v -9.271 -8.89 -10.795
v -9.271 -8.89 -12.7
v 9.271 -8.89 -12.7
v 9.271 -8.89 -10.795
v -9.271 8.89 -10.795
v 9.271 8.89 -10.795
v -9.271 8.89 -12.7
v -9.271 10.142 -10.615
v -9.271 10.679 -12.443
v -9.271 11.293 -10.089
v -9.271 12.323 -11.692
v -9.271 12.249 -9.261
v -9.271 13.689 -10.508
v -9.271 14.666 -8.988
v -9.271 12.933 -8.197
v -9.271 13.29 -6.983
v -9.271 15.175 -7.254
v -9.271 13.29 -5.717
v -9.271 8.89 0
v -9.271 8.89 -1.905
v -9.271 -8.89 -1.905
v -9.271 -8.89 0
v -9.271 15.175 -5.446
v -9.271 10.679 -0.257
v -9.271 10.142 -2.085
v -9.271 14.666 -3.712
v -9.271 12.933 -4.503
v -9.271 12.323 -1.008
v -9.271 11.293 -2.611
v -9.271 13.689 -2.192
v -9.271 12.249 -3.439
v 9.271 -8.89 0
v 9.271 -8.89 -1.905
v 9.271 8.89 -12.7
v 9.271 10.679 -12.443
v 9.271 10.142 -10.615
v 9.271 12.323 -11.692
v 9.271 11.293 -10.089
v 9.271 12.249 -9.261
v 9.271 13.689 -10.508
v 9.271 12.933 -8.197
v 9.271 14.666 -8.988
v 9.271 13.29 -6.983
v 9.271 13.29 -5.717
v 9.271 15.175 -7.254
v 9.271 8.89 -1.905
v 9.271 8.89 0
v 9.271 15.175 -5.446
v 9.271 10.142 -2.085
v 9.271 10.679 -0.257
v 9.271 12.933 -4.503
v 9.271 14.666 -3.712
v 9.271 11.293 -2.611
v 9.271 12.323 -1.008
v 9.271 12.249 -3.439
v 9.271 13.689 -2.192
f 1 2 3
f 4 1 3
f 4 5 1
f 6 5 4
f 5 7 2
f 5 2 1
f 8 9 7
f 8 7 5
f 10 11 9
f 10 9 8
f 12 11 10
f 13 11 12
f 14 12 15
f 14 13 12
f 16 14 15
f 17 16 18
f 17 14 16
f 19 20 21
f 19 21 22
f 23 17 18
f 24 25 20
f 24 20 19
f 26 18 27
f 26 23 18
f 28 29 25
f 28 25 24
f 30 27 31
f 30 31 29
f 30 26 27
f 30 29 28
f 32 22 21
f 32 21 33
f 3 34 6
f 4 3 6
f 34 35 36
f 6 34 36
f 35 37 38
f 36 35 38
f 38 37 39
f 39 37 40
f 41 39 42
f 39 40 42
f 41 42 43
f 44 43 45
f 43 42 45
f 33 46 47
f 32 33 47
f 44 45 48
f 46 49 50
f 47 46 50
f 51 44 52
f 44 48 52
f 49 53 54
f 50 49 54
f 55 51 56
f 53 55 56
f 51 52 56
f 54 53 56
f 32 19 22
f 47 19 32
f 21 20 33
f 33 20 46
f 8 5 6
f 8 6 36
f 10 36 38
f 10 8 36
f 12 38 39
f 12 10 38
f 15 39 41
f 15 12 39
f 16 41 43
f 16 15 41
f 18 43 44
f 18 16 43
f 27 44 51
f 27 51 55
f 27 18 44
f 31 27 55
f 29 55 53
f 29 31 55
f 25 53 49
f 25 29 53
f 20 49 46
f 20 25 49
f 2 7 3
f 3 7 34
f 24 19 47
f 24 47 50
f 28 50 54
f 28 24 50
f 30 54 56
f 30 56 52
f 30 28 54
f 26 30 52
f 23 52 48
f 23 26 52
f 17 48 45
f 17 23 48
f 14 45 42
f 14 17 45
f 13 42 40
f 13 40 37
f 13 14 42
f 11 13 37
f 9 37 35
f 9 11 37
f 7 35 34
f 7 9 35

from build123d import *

# Parameters (mm, degrees)
SKETCH1_W           = 18.542
SKETCH1_H           = 17.78
BOSS_EXTRUDE4_DEPTH = 1.905
SKETCH4_W           = 18.542
SKETCH4_H           = 17.78
BOSS_EXTRUDE5_DEPTH = 1.905
BOSS_EXTRUDE6_DEPTH = 18.542


with BuildPart() as part:
    # Sketch1 → Boss-Extrude4 (new body)
    with BuildSketch(Plane.XY):
        Rectangle(SKETCH1_W, SKETCH1_H)
    extrude(amount=-BOSS_EXTRUDE4_DEPTH)



with BuildPart() as body_2:
    # Sketch4 → Boss-Extrude5 (new body)
    with BuildSketch(Plane.XY.offset(-12.7)):
        Rectangle(SKETCH4_W, SKETCH4_H)
    extrude(amount=BOSS_EXTRUDE5_DEPTH)


with BuildPart() as part_1:
    add(part.part)

    add(body_2.part)  # Boss-Extrude6 merges body 2
    # Sketch6 → Boss-Extrude6 (add)
    with BuildSketch(Plane.ZY.offset(9.271)):
        with BuildLine():
            Line((-12.7, 8.89), (-10.795, 8.89))
            ThreePointArc((-10.795, 8.89), (-6.35, 13.335), (-1.905, 8.89))
            Line((-1.905, 8.89), (0, 8.89))
            ThreePointArc((0, 8.89), (-6.35, 15.24), (-12.7, 8.89))
        make_face()
    extrude(amount=-BOSS_EXTRUDE6_DEPTH)


solid = part_1.part
